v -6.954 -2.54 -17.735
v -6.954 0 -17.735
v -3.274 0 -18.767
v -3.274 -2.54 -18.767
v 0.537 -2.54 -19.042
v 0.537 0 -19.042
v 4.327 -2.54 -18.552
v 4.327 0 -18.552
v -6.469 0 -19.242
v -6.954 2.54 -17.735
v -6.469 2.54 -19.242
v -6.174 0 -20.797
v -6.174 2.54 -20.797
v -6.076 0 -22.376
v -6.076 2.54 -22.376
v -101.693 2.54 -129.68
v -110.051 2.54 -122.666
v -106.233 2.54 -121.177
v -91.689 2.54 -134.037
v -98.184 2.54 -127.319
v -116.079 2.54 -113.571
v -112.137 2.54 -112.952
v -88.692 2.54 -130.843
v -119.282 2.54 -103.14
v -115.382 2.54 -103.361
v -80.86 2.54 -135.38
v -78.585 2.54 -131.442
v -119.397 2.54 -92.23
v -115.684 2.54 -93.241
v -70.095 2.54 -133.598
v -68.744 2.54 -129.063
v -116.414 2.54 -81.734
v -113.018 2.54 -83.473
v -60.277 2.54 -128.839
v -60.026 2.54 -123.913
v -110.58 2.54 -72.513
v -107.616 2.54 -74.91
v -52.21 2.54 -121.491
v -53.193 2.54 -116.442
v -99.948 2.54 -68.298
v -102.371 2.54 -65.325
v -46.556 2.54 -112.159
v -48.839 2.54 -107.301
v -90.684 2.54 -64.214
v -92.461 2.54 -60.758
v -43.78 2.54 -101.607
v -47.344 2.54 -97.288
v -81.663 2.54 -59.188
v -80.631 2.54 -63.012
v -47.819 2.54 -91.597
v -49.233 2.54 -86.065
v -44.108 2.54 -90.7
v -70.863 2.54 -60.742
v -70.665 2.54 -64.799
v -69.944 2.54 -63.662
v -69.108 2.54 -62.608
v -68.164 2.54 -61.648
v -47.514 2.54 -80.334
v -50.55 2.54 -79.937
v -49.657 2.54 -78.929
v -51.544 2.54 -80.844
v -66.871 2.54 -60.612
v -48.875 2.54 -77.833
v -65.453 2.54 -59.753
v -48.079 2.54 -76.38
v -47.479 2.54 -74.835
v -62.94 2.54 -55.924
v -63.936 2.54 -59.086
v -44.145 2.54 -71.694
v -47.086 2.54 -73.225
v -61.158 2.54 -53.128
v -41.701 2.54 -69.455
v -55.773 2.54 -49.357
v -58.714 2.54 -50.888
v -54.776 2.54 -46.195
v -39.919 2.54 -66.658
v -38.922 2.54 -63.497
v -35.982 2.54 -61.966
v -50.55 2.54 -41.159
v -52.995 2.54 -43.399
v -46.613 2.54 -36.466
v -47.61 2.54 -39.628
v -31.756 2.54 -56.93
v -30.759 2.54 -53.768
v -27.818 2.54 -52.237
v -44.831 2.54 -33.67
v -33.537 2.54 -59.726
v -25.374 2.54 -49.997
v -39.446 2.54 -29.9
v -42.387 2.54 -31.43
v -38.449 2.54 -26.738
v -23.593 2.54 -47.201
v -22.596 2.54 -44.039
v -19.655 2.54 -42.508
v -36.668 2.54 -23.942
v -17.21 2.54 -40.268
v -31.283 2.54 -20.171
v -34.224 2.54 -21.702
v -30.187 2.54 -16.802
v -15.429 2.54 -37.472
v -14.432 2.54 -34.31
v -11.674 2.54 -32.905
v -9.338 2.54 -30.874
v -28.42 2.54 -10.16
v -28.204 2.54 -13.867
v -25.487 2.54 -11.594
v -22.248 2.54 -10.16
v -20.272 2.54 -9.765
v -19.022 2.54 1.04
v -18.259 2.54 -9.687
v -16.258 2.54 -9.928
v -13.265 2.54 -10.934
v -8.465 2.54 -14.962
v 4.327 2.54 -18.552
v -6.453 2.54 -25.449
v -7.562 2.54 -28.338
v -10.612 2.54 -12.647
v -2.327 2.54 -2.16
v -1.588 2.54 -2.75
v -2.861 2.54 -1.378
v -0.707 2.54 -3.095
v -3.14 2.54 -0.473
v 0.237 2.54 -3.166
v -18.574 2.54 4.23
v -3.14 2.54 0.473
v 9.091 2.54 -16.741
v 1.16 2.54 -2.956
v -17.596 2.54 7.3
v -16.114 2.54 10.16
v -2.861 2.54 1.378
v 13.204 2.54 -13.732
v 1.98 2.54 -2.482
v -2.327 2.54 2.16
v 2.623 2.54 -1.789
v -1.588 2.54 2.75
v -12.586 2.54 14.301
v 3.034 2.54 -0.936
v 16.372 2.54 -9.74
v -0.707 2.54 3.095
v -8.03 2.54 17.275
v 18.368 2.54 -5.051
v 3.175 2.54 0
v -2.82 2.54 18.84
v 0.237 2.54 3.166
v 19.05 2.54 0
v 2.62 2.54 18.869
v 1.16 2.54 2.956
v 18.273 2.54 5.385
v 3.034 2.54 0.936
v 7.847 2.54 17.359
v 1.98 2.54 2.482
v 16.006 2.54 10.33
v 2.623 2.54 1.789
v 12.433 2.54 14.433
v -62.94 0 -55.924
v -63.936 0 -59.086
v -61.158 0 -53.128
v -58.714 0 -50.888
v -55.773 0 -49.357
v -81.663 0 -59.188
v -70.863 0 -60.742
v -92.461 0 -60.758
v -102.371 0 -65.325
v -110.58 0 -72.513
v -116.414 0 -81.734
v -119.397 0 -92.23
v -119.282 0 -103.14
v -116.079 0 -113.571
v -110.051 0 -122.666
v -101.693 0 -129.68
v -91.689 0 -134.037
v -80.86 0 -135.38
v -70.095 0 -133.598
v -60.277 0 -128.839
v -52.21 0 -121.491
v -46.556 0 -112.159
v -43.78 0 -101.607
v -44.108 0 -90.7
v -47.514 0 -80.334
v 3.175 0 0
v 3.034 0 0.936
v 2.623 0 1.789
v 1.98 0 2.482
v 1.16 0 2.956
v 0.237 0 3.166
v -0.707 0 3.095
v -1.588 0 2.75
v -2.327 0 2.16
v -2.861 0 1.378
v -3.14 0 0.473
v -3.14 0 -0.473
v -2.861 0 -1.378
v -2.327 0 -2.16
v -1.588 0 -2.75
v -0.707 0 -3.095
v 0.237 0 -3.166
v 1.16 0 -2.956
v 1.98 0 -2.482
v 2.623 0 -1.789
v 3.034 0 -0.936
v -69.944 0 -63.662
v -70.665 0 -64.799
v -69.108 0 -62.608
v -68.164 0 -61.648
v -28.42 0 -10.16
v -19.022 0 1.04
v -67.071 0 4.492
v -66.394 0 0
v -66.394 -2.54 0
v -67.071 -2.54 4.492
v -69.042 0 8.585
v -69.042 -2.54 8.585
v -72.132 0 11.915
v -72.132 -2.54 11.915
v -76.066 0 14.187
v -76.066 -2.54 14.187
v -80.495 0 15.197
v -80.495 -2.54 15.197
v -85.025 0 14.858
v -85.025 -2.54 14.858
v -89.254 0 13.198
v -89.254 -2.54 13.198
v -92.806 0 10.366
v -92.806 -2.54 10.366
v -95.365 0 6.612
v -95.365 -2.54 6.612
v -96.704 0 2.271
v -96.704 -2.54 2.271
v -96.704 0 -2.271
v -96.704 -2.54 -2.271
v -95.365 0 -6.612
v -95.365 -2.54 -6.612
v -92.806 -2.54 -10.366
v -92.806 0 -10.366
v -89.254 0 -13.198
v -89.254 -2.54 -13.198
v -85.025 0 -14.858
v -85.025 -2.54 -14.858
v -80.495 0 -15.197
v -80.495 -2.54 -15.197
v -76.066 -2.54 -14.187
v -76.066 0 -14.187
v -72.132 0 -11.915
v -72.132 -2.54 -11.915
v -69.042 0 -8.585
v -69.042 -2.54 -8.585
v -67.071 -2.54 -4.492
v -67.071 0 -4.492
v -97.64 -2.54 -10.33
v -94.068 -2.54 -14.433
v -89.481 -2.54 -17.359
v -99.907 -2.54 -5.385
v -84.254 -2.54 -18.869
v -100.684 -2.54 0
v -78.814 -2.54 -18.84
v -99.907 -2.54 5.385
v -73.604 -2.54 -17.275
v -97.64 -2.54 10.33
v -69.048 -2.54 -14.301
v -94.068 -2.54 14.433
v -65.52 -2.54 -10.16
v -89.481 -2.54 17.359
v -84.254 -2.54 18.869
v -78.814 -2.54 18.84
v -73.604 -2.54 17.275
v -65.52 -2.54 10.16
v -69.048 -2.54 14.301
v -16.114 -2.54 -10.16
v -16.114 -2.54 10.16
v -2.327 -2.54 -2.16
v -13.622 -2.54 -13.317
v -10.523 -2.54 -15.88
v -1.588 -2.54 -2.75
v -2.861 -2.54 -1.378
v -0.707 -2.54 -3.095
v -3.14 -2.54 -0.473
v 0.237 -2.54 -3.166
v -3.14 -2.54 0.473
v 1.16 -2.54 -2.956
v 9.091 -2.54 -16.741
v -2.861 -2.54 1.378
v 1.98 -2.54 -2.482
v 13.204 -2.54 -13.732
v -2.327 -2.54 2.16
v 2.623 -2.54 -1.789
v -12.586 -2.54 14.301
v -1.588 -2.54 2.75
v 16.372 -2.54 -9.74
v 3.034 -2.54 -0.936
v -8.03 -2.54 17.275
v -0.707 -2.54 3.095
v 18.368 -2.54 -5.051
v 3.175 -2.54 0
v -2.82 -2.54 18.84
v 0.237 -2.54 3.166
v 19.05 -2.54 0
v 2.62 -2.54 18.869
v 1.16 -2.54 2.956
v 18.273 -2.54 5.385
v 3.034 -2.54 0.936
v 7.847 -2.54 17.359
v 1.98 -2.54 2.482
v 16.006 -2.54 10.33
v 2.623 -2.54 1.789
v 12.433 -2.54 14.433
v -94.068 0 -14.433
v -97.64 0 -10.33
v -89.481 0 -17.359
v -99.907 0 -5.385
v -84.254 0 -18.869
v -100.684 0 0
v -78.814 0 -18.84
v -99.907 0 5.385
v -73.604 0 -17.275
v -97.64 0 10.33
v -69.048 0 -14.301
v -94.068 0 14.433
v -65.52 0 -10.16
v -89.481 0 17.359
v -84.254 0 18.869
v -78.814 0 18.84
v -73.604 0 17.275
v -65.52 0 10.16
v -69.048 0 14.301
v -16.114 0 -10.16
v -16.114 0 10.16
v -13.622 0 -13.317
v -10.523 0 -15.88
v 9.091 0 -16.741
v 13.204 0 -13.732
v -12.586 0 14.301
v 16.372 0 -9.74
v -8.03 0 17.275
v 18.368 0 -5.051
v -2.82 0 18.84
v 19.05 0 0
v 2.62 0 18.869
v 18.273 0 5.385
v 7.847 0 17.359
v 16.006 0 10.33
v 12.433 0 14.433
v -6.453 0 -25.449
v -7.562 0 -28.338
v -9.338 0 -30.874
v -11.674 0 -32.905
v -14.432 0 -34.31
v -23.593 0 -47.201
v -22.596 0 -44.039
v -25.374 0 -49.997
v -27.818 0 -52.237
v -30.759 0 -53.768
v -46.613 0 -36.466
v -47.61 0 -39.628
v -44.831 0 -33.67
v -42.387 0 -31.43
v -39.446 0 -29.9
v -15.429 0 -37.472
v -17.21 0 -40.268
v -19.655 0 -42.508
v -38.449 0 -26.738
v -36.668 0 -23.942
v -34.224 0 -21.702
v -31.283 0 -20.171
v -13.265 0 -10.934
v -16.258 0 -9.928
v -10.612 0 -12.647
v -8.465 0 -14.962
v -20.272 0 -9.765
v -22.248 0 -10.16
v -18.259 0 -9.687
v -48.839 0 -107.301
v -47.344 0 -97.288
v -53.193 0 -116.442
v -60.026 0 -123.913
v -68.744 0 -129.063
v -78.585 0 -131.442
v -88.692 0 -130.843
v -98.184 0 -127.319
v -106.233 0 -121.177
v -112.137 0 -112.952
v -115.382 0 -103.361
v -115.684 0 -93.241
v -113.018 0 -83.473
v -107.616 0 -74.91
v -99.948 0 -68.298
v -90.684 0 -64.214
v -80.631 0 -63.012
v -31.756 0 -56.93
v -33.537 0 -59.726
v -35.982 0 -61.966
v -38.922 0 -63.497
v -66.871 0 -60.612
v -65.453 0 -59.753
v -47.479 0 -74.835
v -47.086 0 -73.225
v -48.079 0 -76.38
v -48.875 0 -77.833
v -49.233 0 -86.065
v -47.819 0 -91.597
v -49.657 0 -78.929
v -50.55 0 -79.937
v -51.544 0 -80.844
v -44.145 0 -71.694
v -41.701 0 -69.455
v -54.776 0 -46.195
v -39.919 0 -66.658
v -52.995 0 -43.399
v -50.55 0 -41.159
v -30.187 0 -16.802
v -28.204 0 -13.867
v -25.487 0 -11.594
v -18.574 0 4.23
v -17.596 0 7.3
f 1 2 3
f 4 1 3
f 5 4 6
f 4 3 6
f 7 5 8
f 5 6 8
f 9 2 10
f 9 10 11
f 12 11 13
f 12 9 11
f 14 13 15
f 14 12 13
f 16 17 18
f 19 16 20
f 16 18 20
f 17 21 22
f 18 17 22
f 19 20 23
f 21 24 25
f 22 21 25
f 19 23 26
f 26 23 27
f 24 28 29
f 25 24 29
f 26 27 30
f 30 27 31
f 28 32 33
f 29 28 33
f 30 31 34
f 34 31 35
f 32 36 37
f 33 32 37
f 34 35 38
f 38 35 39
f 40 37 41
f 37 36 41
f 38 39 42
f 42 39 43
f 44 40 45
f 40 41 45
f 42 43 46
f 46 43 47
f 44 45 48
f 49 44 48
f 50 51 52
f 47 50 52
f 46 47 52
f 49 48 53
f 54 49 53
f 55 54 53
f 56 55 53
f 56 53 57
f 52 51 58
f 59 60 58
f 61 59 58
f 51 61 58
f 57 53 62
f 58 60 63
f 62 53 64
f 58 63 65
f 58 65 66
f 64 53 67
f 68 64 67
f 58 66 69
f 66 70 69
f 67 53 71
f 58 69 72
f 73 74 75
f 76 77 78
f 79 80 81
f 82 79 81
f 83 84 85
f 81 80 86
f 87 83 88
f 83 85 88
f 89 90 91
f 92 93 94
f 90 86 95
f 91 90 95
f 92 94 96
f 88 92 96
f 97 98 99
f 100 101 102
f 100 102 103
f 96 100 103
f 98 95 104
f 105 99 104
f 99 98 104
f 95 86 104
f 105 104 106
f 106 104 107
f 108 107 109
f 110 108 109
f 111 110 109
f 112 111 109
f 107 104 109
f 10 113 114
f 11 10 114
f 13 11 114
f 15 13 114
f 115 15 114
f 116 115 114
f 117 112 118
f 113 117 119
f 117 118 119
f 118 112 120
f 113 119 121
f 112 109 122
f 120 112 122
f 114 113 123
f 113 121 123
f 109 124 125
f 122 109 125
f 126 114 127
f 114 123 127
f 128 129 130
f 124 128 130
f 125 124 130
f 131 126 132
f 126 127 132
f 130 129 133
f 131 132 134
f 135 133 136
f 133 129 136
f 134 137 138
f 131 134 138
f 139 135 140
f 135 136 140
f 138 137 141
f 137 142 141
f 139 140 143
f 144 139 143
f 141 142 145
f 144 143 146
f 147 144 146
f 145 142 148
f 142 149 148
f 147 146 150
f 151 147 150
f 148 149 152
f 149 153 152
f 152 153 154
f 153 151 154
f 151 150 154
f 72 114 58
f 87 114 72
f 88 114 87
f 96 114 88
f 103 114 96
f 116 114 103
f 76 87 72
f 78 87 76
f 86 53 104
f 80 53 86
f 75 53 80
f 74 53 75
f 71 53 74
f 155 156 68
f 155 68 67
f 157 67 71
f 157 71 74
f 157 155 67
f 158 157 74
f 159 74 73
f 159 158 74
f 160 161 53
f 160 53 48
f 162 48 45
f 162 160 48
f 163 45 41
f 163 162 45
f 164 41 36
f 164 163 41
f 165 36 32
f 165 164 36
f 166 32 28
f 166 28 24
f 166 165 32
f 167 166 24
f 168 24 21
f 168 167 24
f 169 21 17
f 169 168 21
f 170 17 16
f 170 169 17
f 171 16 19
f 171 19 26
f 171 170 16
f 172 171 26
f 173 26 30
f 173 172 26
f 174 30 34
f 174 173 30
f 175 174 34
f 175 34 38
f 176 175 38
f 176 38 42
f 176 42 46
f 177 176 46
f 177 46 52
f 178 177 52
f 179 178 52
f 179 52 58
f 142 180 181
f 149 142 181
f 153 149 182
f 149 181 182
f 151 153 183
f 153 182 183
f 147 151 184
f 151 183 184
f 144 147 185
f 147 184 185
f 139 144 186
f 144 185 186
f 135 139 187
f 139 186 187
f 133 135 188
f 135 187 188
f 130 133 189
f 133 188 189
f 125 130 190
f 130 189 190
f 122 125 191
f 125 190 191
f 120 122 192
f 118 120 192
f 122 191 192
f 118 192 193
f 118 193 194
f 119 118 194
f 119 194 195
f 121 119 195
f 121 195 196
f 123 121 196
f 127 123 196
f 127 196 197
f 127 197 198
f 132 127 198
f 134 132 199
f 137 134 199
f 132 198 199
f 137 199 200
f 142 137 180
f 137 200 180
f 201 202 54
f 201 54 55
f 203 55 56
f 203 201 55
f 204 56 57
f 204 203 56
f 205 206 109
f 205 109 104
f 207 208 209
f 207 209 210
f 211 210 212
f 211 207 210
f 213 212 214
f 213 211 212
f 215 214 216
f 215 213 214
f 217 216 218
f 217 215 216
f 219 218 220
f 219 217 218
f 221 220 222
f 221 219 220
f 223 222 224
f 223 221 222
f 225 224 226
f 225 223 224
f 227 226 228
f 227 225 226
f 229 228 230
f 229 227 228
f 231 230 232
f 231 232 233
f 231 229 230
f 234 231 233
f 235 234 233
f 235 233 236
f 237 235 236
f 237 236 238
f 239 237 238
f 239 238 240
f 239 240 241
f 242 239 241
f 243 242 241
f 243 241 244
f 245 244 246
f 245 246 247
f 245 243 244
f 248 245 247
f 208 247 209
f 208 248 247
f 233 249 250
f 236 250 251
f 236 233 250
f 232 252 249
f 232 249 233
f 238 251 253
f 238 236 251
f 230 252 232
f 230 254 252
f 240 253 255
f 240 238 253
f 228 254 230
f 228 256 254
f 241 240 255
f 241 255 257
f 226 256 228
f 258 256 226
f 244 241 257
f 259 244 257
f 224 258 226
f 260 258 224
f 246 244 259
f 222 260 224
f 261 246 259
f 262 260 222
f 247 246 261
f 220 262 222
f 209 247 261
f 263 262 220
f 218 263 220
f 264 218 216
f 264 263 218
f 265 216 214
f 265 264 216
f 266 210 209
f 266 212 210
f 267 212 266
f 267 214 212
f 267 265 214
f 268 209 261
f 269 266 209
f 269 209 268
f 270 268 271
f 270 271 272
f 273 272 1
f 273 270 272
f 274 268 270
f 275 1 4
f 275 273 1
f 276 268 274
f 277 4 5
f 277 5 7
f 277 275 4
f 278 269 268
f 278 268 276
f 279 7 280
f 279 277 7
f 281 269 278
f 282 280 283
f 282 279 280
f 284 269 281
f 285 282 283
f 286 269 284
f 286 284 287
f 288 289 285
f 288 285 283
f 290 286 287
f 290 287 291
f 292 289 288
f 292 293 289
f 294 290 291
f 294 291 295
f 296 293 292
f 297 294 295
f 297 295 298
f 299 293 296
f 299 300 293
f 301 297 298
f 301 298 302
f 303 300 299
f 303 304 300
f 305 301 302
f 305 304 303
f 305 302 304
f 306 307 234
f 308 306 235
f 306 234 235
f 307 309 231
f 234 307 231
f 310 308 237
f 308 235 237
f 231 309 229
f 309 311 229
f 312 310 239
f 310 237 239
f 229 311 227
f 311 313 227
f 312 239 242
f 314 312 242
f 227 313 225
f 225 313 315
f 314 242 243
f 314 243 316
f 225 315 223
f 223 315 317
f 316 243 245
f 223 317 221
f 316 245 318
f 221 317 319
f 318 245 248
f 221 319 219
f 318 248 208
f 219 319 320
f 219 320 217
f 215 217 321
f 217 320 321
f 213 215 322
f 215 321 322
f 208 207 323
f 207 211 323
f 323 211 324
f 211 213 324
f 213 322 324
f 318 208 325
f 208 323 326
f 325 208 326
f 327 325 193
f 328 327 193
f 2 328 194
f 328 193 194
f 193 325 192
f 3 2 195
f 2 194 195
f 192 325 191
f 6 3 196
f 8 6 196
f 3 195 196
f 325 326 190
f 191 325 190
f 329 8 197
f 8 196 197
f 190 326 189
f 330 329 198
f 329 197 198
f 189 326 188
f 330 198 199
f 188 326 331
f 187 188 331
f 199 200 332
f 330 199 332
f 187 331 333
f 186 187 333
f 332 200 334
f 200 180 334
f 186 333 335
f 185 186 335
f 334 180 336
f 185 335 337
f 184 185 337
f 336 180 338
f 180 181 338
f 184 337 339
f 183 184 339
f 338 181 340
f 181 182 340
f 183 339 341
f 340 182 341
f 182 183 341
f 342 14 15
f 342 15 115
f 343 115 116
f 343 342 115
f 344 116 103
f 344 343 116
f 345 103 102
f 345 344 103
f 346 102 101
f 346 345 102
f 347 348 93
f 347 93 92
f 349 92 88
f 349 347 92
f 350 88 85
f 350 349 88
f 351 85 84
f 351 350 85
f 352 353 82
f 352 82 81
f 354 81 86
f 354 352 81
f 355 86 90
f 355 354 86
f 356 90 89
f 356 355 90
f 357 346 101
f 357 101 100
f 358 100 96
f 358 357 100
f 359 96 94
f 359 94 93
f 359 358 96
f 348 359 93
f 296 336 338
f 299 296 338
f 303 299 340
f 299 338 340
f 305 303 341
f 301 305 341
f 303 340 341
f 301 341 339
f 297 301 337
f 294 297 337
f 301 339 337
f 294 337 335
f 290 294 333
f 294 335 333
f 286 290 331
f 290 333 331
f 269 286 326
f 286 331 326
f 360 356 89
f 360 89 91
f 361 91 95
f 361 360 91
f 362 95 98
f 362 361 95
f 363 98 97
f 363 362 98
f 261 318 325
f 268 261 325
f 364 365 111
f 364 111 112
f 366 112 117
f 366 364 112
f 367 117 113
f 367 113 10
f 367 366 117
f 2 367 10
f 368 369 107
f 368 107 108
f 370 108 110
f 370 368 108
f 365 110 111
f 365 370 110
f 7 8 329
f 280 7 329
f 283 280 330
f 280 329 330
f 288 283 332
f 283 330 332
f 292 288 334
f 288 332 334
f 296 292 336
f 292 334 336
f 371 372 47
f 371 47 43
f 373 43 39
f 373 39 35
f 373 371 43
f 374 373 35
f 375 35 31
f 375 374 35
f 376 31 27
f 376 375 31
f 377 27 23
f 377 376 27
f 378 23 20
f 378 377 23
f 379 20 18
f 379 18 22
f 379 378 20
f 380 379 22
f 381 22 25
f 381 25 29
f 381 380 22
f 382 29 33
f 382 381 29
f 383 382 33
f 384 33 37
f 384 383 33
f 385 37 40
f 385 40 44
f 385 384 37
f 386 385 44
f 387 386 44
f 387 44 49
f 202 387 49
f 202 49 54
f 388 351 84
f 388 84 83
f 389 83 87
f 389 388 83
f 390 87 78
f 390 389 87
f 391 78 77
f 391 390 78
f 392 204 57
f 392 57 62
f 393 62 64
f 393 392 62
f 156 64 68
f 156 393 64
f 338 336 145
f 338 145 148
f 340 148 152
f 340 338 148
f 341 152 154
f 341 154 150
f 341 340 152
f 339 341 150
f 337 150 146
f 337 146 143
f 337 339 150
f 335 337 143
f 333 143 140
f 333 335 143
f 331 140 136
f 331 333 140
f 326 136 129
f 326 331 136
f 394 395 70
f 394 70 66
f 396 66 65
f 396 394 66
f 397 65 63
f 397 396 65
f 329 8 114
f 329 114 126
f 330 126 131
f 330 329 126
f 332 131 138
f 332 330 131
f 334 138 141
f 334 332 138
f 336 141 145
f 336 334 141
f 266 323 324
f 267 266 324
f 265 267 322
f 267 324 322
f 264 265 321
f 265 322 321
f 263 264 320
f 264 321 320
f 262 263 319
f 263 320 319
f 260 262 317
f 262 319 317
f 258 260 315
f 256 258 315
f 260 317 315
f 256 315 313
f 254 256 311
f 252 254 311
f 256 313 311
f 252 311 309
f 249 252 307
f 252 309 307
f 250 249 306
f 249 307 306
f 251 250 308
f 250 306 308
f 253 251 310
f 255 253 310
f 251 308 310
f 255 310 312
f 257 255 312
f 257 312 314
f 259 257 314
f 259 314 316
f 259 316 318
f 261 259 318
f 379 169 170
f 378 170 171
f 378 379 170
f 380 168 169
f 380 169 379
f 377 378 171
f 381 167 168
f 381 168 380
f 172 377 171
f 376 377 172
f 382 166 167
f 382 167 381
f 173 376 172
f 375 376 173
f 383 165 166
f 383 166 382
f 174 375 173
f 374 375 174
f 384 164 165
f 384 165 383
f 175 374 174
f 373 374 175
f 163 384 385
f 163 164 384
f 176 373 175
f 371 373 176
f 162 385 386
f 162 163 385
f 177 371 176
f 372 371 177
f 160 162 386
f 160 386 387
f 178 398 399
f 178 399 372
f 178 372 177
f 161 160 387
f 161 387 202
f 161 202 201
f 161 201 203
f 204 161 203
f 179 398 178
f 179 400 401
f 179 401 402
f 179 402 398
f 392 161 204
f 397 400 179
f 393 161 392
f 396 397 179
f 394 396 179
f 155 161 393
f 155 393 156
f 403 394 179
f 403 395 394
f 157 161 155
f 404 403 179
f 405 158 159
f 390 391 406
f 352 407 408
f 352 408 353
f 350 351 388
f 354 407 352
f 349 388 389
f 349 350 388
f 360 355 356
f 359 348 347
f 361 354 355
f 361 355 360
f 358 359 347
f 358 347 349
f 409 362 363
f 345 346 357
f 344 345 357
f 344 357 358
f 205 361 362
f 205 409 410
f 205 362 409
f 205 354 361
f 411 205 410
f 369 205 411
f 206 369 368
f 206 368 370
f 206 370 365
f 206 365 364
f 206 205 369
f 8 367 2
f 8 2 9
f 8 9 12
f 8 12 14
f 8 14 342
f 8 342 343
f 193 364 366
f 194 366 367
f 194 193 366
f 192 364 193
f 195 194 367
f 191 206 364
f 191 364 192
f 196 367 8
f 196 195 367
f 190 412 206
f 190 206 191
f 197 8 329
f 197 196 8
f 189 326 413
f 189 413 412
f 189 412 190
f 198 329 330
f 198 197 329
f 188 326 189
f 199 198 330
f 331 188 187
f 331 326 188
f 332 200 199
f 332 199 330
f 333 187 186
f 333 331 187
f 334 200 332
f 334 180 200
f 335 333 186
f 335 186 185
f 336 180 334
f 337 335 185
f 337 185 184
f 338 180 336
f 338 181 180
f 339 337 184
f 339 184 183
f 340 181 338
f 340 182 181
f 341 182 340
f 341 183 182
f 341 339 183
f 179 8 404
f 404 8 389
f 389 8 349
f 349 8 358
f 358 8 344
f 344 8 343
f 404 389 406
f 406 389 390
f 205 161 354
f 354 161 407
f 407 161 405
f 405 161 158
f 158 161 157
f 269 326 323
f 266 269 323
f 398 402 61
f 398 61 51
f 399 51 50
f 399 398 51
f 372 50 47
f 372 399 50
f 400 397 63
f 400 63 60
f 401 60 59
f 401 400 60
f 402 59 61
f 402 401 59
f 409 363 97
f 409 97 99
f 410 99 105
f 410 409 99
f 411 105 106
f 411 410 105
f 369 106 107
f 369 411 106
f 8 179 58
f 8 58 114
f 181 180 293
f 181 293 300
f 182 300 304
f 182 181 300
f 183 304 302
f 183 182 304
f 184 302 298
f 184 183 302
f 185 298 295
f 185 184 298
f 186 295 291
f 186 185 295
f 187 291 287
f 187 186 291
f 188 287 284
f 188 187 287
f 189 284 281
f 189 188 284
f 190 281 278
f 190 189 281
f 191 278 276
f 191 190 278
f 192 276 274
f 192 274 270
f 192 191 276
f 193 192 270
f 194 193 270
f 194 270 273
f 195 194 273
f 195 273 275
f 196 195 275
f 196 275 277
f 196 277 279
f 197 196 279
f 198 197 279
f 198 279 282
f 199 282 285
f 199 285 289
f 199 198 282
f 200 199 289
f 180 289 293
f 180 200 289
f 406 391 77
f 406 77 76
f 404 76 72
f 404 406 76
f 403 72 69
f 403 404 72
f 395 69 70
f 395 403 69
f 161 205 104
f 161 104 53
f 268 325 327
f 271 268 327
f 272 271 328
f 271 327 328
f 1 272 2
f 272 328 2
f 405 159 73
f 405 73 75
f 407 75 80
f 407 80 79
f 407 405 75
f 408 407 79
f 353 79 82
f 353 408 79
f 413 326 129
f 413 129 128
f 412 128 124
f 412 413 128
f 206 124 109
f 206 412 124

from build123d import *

# Parameters (mm, degrees)
F0_R     = 15.24
F0_R_2   = 3.175
F1_DEPTH = 2.54
F2_DEPTH = 2.54


with BuildPart() as f1:
    # F0 (on Front) → F1 (new body)
    with BuildSketch(Plane.XZ):
        with BuildLine():
            ThreePointArc((-65.5195329538, -10.16), (-63.3326111745, -5.287787783), (-62.5840264302, 0))
            ThreePointArc((-62.5840264302, 0), (-63.3326111745, 5.287787783), (-65.5195329538, 10.16))
            ThreePointArc((-65.5195329538, 10.16), (-100.6840264302, 0), (-65.5195329538, -10.16))
        make_face()
        with Locations((-81.6340264302, 0)):
            Circle(F0_R, mode=Mode.SUBTRACT)
        with BuildLine():
            ThreePointArc((-65.5195329538, 10.16), (-63.3326111745, 5.287787783), (-62.5840264302, 0))
            ThreePointArc((-62.5840264302, 0), (-63.3326111745, -5.287787783), (-65.5195329538, -10.16))
            Line((-65.5195329538, -10.16), (-28.4196593422, -10.16))
            Line((-28.4196593422, -10.16), (-19.0215796919, 1.0401951868))
            ThreePointArc((-19.0215796919, 1.0401951868), (-18.1501685771, 5.7856616408), (-16.1144934764, 10.16))
            Line((-16.1144934764, 10.16), (-65.5195329538, 10.16))
        make_face()
        with BuildLine():
            ThreePointArc((19.05, 0), (5.287787783, 18.3014152557), (-16.1144934764, 10.16))
            ThreePointArc((-16.1144934764, 10.16), (-18.1501685771, 5.7856616408), (-19.0215796919, 1.0401951868))
            ThreePointArc((-19.0215796919, 1.0401951868), (-18.4728068477, -4.6538056648), (-16.2583471742, -9.9281744125))
            ThreePointArc((-16.2583471742, -9.9281744125), (-10.6124234359, -12.6473937559), (-6.954110776, -17.7353557426))
            ThreePointArc((-6.954110776, -17.7353557426), (-1.3753346542, -19.0002882765), (4.3274549344, -18.5519711565))
            ThreePointArc((4.3274549344, -18.5519711565), (14.9221398683, -11.8419695047), (19.05, 0))
        make_face()
        Circle(F0_R_2, mode=Mode.SUBTRACT)
        with BuildLine():
            ThreePointArc((-16.2583471742, -9.9281744125), (-19.2670095389, -9.6856602103), (-22.2479261978, -10.16))
            Line((-22.2479261978, -10.16), (-16.1144934764, -10.16))
            ThreePointArc((-16.1144934764, -10.16), (-16.1868353523, -10.0443447411), (-16.2583471742, -9.9281744125))
        make_face()
        with BuildLine():
            Line((-19.0215796919, 1.0401951868), (-28.4196593422, -10.16))
            Line((-28.4196593422, -10.16), (-22.2479261978, -10.16))
            ThreePointArc((-22.2479261978, -10.16), (-19.2670095389, -9.6856602103), (-16.2583471742, -9.9281744125))
            ThreePointArc((-16.2583471742, -9.9281744125), (-18.4728068477, -4.6538056648), (-19.0215796919, 1.0401951868))
        make_face()
        with BuildLine():
            ThreePointArc((-6.954110776, -17.7353557426), (-10.6124234359, -12.6473937559), (-16.2583471742, -9.9281744125))
            ThreePointArc((-16.2583471742, -9.9281744125), (-16.1868353523, -10.0443447411), (-16.1144934764, -10.16))
            ThreePointArc((-16.1144934764, -10.16), (-12.1402895021, -14.6804588077), (-6.954110776, -17.7353557426))
        make_face()
    extrude(amount=F1_DEPTH)


with BuildPart() as f2:
    # F0 (on Front) → F2 (new body)
    with BuildSketch(Plane.XZ):
        with BuildLine():
            Line((-47.513862793, -80.334047803), (4.3274549344, -18.5519711565))
            ThreePointArc((4.3274549344, -18.5519711565), (-1.3753346542, -19.0002882765), (-6.954110776, -17.7353557426))
            ThreePointArc((-6.954110776, -17.7353557426), (-6.2973288868, -20.014568078), (-6.0758260789, -22.3761581835))
            ThreePointArc((-6.0758260789, -22.3761581835), (-8.3725951165, -29.6605789252), (-14.4321702587, -34.3102544675))
            ThreePointArc((-14.4321702587, -34.3102544675), (-17.2104642944, -40.2683252541), (-22.5955729017, -44.0390188951))
            ThreePointArc((-22.5955729017, -44.0390188951), (-25.3738669374, -49.9970896817), (-30.7589755447, -53.7677833227))
            ThreePointArc((-30.7589755447, -53.7677833227), (-33.5372695804, -59.7258541094), (-38.9223781878, -63.4965477503))
            ThreePointArc((-38.9223781878, -63.4965477503), (-41.7006722234, -69.454618537), (-47.0857808308, -73.2253121779))
            ThreePointArc((-47.0857808308, -73.2253121779), (-47.7541230349, -75.6172400855), (-48.8751976268, -77.8333610605))
            ThreePointArc((-48.8751976268, -77.8333610605), (-48.1711624462, -79.0709833859), (-47.513862793, -80.334047803))
        make_face()
        with BuildLine():
            ThreePointArc((-68.1638084144, -61.6482948628), (-69.5048829018, -61.1698664199), (-70.8628974193, -60.7418814597))
            ThreePointArc((-70.8628974193, -60.7418814597), (-112.1462372262, -120.1046333926), (-43.5340264302, -97.2876442761))
            ThreePointArc((-43.5340264302, -97.2876442761), (-44.542327665, -88.580412643), (-47.513862793, -80.334047803))
            ThreePointArc((-47.513862793, -80.334047803), (-48.1711624462, -79.0709833859), (-48.8751976268, -77.8333610605))
            ThreePointArc((-48.8751976268, -77.8333610605), (-50.0896781123, -79.44493893), (-51.5440882931, -80.8438088687))
            ThreePointArc((-51.5440882931, -80.8438088687), (-48.4106304665, -88.8017700937), (-47.3440264302, -97.2876442761))
            ThreePointArc((-47.3440264302, -97.2876442761), (-109.4901704698, -117.2836273539), (-70.6650727554, -64.7993978587))
            ThreePointArc((-70.6650727554, -64.7993978587), (-69.5400104718, -63.124172221), (-68.1638084144, -61.6482948628))
        make_face()
        with BuildLine():
            Line((-22.2479261978, -10.16), (-28.4196593422, -10.16))
            Line((-28.4196593422, -10.16), (-70.8628974193, -60.7418814597))
            ThreePointArc((-70.8628974193, -60.7418814597), (-69.5048829018, -61.1698664199), (-68.1638084144, -61.6482948628))
            ThreePointArc((-68.1638084144, -61.6482948628), (-66.1760278564, -60.1594265442), (-63.9364951143, -59.0858840376))
            ThreePointArc((-63.9364951143, -59.0858840376), (-61.1582010786, -53.1278132509), (-55.7730924713, -49.35711961))
            ThreePointArc((-55.7730924713, -49.35711961), (-52.9947984356, -43.3990488233), (-47.6096898282, -39.6283551824))
            ThreePointArc((-47.6096898282, -39.6283551824), (-44.8313957926, -33.6702843957), (-39.4462871852, -29.8995907547))
            ThreePointArc((-39.4462871852, -29.8995907547), (-36.6679931496, -23.9415199681), (-31.2828845422, -20.1708263271))
            ThreePointArc((-31.2828845422, -20.1708263271), (-28.2038448627, -13.8671945678), (-22.2479261978, -10.16))
        make_face()
        with BuildLine():
            Line((-19.0215796919, 1.0401951868), (-28.4196593422, -10.16))
            Line((-28.4196593422, -10.16), (-22.2479261978, -10.16))
            ThreePointArc((-22.2479261978, -10.16), (-19.2670095389, -9.6856602103), (-16.2583471742, -9.9281744125))
            ThreePointArc((-16.2583471742, -9.9281744125), (-18.4728068477, -4.6538056648), (-19.0215796919, 1.0401951868))
        make_face()
        with BuildLine():
            ThreePointArc((19.05, 0), (5.287787783, 18.3014152557), (-16.1144934764, 10.16))
            ThreePointArc((-16.1144934764, 10.16), (-18.1501685771, 5.7856616408), (-19.0215796919, 1.0401951868))
            ThreePointArc((-19.0215796919, 1.0401951868), (-18.4728068477, -4.6538056648), (-16.2583471742, -9.9281744125))
            ThreePointArc((-16.2583471742, -9.9281744125), (-10.6124234359, -12.6473937559), (-6.954110776, -17.7353557426))
            ThreePointArc((-6.954110776, -17.7353557426), (-1.3753346542, -19.0002882765), (4.3274549344, -18.5519711565))
            ThreePointArc((4.3274549344, -18.5519711565), (14.9221398683, -11.8419695047), (19.05, 0))
        make_face()
        Circle(F0_R_2, mode=Mode.SUBTRACT)
    extrude(amount=-F2_DEPTH)


solid = Compound([f1.part, f2.part])
